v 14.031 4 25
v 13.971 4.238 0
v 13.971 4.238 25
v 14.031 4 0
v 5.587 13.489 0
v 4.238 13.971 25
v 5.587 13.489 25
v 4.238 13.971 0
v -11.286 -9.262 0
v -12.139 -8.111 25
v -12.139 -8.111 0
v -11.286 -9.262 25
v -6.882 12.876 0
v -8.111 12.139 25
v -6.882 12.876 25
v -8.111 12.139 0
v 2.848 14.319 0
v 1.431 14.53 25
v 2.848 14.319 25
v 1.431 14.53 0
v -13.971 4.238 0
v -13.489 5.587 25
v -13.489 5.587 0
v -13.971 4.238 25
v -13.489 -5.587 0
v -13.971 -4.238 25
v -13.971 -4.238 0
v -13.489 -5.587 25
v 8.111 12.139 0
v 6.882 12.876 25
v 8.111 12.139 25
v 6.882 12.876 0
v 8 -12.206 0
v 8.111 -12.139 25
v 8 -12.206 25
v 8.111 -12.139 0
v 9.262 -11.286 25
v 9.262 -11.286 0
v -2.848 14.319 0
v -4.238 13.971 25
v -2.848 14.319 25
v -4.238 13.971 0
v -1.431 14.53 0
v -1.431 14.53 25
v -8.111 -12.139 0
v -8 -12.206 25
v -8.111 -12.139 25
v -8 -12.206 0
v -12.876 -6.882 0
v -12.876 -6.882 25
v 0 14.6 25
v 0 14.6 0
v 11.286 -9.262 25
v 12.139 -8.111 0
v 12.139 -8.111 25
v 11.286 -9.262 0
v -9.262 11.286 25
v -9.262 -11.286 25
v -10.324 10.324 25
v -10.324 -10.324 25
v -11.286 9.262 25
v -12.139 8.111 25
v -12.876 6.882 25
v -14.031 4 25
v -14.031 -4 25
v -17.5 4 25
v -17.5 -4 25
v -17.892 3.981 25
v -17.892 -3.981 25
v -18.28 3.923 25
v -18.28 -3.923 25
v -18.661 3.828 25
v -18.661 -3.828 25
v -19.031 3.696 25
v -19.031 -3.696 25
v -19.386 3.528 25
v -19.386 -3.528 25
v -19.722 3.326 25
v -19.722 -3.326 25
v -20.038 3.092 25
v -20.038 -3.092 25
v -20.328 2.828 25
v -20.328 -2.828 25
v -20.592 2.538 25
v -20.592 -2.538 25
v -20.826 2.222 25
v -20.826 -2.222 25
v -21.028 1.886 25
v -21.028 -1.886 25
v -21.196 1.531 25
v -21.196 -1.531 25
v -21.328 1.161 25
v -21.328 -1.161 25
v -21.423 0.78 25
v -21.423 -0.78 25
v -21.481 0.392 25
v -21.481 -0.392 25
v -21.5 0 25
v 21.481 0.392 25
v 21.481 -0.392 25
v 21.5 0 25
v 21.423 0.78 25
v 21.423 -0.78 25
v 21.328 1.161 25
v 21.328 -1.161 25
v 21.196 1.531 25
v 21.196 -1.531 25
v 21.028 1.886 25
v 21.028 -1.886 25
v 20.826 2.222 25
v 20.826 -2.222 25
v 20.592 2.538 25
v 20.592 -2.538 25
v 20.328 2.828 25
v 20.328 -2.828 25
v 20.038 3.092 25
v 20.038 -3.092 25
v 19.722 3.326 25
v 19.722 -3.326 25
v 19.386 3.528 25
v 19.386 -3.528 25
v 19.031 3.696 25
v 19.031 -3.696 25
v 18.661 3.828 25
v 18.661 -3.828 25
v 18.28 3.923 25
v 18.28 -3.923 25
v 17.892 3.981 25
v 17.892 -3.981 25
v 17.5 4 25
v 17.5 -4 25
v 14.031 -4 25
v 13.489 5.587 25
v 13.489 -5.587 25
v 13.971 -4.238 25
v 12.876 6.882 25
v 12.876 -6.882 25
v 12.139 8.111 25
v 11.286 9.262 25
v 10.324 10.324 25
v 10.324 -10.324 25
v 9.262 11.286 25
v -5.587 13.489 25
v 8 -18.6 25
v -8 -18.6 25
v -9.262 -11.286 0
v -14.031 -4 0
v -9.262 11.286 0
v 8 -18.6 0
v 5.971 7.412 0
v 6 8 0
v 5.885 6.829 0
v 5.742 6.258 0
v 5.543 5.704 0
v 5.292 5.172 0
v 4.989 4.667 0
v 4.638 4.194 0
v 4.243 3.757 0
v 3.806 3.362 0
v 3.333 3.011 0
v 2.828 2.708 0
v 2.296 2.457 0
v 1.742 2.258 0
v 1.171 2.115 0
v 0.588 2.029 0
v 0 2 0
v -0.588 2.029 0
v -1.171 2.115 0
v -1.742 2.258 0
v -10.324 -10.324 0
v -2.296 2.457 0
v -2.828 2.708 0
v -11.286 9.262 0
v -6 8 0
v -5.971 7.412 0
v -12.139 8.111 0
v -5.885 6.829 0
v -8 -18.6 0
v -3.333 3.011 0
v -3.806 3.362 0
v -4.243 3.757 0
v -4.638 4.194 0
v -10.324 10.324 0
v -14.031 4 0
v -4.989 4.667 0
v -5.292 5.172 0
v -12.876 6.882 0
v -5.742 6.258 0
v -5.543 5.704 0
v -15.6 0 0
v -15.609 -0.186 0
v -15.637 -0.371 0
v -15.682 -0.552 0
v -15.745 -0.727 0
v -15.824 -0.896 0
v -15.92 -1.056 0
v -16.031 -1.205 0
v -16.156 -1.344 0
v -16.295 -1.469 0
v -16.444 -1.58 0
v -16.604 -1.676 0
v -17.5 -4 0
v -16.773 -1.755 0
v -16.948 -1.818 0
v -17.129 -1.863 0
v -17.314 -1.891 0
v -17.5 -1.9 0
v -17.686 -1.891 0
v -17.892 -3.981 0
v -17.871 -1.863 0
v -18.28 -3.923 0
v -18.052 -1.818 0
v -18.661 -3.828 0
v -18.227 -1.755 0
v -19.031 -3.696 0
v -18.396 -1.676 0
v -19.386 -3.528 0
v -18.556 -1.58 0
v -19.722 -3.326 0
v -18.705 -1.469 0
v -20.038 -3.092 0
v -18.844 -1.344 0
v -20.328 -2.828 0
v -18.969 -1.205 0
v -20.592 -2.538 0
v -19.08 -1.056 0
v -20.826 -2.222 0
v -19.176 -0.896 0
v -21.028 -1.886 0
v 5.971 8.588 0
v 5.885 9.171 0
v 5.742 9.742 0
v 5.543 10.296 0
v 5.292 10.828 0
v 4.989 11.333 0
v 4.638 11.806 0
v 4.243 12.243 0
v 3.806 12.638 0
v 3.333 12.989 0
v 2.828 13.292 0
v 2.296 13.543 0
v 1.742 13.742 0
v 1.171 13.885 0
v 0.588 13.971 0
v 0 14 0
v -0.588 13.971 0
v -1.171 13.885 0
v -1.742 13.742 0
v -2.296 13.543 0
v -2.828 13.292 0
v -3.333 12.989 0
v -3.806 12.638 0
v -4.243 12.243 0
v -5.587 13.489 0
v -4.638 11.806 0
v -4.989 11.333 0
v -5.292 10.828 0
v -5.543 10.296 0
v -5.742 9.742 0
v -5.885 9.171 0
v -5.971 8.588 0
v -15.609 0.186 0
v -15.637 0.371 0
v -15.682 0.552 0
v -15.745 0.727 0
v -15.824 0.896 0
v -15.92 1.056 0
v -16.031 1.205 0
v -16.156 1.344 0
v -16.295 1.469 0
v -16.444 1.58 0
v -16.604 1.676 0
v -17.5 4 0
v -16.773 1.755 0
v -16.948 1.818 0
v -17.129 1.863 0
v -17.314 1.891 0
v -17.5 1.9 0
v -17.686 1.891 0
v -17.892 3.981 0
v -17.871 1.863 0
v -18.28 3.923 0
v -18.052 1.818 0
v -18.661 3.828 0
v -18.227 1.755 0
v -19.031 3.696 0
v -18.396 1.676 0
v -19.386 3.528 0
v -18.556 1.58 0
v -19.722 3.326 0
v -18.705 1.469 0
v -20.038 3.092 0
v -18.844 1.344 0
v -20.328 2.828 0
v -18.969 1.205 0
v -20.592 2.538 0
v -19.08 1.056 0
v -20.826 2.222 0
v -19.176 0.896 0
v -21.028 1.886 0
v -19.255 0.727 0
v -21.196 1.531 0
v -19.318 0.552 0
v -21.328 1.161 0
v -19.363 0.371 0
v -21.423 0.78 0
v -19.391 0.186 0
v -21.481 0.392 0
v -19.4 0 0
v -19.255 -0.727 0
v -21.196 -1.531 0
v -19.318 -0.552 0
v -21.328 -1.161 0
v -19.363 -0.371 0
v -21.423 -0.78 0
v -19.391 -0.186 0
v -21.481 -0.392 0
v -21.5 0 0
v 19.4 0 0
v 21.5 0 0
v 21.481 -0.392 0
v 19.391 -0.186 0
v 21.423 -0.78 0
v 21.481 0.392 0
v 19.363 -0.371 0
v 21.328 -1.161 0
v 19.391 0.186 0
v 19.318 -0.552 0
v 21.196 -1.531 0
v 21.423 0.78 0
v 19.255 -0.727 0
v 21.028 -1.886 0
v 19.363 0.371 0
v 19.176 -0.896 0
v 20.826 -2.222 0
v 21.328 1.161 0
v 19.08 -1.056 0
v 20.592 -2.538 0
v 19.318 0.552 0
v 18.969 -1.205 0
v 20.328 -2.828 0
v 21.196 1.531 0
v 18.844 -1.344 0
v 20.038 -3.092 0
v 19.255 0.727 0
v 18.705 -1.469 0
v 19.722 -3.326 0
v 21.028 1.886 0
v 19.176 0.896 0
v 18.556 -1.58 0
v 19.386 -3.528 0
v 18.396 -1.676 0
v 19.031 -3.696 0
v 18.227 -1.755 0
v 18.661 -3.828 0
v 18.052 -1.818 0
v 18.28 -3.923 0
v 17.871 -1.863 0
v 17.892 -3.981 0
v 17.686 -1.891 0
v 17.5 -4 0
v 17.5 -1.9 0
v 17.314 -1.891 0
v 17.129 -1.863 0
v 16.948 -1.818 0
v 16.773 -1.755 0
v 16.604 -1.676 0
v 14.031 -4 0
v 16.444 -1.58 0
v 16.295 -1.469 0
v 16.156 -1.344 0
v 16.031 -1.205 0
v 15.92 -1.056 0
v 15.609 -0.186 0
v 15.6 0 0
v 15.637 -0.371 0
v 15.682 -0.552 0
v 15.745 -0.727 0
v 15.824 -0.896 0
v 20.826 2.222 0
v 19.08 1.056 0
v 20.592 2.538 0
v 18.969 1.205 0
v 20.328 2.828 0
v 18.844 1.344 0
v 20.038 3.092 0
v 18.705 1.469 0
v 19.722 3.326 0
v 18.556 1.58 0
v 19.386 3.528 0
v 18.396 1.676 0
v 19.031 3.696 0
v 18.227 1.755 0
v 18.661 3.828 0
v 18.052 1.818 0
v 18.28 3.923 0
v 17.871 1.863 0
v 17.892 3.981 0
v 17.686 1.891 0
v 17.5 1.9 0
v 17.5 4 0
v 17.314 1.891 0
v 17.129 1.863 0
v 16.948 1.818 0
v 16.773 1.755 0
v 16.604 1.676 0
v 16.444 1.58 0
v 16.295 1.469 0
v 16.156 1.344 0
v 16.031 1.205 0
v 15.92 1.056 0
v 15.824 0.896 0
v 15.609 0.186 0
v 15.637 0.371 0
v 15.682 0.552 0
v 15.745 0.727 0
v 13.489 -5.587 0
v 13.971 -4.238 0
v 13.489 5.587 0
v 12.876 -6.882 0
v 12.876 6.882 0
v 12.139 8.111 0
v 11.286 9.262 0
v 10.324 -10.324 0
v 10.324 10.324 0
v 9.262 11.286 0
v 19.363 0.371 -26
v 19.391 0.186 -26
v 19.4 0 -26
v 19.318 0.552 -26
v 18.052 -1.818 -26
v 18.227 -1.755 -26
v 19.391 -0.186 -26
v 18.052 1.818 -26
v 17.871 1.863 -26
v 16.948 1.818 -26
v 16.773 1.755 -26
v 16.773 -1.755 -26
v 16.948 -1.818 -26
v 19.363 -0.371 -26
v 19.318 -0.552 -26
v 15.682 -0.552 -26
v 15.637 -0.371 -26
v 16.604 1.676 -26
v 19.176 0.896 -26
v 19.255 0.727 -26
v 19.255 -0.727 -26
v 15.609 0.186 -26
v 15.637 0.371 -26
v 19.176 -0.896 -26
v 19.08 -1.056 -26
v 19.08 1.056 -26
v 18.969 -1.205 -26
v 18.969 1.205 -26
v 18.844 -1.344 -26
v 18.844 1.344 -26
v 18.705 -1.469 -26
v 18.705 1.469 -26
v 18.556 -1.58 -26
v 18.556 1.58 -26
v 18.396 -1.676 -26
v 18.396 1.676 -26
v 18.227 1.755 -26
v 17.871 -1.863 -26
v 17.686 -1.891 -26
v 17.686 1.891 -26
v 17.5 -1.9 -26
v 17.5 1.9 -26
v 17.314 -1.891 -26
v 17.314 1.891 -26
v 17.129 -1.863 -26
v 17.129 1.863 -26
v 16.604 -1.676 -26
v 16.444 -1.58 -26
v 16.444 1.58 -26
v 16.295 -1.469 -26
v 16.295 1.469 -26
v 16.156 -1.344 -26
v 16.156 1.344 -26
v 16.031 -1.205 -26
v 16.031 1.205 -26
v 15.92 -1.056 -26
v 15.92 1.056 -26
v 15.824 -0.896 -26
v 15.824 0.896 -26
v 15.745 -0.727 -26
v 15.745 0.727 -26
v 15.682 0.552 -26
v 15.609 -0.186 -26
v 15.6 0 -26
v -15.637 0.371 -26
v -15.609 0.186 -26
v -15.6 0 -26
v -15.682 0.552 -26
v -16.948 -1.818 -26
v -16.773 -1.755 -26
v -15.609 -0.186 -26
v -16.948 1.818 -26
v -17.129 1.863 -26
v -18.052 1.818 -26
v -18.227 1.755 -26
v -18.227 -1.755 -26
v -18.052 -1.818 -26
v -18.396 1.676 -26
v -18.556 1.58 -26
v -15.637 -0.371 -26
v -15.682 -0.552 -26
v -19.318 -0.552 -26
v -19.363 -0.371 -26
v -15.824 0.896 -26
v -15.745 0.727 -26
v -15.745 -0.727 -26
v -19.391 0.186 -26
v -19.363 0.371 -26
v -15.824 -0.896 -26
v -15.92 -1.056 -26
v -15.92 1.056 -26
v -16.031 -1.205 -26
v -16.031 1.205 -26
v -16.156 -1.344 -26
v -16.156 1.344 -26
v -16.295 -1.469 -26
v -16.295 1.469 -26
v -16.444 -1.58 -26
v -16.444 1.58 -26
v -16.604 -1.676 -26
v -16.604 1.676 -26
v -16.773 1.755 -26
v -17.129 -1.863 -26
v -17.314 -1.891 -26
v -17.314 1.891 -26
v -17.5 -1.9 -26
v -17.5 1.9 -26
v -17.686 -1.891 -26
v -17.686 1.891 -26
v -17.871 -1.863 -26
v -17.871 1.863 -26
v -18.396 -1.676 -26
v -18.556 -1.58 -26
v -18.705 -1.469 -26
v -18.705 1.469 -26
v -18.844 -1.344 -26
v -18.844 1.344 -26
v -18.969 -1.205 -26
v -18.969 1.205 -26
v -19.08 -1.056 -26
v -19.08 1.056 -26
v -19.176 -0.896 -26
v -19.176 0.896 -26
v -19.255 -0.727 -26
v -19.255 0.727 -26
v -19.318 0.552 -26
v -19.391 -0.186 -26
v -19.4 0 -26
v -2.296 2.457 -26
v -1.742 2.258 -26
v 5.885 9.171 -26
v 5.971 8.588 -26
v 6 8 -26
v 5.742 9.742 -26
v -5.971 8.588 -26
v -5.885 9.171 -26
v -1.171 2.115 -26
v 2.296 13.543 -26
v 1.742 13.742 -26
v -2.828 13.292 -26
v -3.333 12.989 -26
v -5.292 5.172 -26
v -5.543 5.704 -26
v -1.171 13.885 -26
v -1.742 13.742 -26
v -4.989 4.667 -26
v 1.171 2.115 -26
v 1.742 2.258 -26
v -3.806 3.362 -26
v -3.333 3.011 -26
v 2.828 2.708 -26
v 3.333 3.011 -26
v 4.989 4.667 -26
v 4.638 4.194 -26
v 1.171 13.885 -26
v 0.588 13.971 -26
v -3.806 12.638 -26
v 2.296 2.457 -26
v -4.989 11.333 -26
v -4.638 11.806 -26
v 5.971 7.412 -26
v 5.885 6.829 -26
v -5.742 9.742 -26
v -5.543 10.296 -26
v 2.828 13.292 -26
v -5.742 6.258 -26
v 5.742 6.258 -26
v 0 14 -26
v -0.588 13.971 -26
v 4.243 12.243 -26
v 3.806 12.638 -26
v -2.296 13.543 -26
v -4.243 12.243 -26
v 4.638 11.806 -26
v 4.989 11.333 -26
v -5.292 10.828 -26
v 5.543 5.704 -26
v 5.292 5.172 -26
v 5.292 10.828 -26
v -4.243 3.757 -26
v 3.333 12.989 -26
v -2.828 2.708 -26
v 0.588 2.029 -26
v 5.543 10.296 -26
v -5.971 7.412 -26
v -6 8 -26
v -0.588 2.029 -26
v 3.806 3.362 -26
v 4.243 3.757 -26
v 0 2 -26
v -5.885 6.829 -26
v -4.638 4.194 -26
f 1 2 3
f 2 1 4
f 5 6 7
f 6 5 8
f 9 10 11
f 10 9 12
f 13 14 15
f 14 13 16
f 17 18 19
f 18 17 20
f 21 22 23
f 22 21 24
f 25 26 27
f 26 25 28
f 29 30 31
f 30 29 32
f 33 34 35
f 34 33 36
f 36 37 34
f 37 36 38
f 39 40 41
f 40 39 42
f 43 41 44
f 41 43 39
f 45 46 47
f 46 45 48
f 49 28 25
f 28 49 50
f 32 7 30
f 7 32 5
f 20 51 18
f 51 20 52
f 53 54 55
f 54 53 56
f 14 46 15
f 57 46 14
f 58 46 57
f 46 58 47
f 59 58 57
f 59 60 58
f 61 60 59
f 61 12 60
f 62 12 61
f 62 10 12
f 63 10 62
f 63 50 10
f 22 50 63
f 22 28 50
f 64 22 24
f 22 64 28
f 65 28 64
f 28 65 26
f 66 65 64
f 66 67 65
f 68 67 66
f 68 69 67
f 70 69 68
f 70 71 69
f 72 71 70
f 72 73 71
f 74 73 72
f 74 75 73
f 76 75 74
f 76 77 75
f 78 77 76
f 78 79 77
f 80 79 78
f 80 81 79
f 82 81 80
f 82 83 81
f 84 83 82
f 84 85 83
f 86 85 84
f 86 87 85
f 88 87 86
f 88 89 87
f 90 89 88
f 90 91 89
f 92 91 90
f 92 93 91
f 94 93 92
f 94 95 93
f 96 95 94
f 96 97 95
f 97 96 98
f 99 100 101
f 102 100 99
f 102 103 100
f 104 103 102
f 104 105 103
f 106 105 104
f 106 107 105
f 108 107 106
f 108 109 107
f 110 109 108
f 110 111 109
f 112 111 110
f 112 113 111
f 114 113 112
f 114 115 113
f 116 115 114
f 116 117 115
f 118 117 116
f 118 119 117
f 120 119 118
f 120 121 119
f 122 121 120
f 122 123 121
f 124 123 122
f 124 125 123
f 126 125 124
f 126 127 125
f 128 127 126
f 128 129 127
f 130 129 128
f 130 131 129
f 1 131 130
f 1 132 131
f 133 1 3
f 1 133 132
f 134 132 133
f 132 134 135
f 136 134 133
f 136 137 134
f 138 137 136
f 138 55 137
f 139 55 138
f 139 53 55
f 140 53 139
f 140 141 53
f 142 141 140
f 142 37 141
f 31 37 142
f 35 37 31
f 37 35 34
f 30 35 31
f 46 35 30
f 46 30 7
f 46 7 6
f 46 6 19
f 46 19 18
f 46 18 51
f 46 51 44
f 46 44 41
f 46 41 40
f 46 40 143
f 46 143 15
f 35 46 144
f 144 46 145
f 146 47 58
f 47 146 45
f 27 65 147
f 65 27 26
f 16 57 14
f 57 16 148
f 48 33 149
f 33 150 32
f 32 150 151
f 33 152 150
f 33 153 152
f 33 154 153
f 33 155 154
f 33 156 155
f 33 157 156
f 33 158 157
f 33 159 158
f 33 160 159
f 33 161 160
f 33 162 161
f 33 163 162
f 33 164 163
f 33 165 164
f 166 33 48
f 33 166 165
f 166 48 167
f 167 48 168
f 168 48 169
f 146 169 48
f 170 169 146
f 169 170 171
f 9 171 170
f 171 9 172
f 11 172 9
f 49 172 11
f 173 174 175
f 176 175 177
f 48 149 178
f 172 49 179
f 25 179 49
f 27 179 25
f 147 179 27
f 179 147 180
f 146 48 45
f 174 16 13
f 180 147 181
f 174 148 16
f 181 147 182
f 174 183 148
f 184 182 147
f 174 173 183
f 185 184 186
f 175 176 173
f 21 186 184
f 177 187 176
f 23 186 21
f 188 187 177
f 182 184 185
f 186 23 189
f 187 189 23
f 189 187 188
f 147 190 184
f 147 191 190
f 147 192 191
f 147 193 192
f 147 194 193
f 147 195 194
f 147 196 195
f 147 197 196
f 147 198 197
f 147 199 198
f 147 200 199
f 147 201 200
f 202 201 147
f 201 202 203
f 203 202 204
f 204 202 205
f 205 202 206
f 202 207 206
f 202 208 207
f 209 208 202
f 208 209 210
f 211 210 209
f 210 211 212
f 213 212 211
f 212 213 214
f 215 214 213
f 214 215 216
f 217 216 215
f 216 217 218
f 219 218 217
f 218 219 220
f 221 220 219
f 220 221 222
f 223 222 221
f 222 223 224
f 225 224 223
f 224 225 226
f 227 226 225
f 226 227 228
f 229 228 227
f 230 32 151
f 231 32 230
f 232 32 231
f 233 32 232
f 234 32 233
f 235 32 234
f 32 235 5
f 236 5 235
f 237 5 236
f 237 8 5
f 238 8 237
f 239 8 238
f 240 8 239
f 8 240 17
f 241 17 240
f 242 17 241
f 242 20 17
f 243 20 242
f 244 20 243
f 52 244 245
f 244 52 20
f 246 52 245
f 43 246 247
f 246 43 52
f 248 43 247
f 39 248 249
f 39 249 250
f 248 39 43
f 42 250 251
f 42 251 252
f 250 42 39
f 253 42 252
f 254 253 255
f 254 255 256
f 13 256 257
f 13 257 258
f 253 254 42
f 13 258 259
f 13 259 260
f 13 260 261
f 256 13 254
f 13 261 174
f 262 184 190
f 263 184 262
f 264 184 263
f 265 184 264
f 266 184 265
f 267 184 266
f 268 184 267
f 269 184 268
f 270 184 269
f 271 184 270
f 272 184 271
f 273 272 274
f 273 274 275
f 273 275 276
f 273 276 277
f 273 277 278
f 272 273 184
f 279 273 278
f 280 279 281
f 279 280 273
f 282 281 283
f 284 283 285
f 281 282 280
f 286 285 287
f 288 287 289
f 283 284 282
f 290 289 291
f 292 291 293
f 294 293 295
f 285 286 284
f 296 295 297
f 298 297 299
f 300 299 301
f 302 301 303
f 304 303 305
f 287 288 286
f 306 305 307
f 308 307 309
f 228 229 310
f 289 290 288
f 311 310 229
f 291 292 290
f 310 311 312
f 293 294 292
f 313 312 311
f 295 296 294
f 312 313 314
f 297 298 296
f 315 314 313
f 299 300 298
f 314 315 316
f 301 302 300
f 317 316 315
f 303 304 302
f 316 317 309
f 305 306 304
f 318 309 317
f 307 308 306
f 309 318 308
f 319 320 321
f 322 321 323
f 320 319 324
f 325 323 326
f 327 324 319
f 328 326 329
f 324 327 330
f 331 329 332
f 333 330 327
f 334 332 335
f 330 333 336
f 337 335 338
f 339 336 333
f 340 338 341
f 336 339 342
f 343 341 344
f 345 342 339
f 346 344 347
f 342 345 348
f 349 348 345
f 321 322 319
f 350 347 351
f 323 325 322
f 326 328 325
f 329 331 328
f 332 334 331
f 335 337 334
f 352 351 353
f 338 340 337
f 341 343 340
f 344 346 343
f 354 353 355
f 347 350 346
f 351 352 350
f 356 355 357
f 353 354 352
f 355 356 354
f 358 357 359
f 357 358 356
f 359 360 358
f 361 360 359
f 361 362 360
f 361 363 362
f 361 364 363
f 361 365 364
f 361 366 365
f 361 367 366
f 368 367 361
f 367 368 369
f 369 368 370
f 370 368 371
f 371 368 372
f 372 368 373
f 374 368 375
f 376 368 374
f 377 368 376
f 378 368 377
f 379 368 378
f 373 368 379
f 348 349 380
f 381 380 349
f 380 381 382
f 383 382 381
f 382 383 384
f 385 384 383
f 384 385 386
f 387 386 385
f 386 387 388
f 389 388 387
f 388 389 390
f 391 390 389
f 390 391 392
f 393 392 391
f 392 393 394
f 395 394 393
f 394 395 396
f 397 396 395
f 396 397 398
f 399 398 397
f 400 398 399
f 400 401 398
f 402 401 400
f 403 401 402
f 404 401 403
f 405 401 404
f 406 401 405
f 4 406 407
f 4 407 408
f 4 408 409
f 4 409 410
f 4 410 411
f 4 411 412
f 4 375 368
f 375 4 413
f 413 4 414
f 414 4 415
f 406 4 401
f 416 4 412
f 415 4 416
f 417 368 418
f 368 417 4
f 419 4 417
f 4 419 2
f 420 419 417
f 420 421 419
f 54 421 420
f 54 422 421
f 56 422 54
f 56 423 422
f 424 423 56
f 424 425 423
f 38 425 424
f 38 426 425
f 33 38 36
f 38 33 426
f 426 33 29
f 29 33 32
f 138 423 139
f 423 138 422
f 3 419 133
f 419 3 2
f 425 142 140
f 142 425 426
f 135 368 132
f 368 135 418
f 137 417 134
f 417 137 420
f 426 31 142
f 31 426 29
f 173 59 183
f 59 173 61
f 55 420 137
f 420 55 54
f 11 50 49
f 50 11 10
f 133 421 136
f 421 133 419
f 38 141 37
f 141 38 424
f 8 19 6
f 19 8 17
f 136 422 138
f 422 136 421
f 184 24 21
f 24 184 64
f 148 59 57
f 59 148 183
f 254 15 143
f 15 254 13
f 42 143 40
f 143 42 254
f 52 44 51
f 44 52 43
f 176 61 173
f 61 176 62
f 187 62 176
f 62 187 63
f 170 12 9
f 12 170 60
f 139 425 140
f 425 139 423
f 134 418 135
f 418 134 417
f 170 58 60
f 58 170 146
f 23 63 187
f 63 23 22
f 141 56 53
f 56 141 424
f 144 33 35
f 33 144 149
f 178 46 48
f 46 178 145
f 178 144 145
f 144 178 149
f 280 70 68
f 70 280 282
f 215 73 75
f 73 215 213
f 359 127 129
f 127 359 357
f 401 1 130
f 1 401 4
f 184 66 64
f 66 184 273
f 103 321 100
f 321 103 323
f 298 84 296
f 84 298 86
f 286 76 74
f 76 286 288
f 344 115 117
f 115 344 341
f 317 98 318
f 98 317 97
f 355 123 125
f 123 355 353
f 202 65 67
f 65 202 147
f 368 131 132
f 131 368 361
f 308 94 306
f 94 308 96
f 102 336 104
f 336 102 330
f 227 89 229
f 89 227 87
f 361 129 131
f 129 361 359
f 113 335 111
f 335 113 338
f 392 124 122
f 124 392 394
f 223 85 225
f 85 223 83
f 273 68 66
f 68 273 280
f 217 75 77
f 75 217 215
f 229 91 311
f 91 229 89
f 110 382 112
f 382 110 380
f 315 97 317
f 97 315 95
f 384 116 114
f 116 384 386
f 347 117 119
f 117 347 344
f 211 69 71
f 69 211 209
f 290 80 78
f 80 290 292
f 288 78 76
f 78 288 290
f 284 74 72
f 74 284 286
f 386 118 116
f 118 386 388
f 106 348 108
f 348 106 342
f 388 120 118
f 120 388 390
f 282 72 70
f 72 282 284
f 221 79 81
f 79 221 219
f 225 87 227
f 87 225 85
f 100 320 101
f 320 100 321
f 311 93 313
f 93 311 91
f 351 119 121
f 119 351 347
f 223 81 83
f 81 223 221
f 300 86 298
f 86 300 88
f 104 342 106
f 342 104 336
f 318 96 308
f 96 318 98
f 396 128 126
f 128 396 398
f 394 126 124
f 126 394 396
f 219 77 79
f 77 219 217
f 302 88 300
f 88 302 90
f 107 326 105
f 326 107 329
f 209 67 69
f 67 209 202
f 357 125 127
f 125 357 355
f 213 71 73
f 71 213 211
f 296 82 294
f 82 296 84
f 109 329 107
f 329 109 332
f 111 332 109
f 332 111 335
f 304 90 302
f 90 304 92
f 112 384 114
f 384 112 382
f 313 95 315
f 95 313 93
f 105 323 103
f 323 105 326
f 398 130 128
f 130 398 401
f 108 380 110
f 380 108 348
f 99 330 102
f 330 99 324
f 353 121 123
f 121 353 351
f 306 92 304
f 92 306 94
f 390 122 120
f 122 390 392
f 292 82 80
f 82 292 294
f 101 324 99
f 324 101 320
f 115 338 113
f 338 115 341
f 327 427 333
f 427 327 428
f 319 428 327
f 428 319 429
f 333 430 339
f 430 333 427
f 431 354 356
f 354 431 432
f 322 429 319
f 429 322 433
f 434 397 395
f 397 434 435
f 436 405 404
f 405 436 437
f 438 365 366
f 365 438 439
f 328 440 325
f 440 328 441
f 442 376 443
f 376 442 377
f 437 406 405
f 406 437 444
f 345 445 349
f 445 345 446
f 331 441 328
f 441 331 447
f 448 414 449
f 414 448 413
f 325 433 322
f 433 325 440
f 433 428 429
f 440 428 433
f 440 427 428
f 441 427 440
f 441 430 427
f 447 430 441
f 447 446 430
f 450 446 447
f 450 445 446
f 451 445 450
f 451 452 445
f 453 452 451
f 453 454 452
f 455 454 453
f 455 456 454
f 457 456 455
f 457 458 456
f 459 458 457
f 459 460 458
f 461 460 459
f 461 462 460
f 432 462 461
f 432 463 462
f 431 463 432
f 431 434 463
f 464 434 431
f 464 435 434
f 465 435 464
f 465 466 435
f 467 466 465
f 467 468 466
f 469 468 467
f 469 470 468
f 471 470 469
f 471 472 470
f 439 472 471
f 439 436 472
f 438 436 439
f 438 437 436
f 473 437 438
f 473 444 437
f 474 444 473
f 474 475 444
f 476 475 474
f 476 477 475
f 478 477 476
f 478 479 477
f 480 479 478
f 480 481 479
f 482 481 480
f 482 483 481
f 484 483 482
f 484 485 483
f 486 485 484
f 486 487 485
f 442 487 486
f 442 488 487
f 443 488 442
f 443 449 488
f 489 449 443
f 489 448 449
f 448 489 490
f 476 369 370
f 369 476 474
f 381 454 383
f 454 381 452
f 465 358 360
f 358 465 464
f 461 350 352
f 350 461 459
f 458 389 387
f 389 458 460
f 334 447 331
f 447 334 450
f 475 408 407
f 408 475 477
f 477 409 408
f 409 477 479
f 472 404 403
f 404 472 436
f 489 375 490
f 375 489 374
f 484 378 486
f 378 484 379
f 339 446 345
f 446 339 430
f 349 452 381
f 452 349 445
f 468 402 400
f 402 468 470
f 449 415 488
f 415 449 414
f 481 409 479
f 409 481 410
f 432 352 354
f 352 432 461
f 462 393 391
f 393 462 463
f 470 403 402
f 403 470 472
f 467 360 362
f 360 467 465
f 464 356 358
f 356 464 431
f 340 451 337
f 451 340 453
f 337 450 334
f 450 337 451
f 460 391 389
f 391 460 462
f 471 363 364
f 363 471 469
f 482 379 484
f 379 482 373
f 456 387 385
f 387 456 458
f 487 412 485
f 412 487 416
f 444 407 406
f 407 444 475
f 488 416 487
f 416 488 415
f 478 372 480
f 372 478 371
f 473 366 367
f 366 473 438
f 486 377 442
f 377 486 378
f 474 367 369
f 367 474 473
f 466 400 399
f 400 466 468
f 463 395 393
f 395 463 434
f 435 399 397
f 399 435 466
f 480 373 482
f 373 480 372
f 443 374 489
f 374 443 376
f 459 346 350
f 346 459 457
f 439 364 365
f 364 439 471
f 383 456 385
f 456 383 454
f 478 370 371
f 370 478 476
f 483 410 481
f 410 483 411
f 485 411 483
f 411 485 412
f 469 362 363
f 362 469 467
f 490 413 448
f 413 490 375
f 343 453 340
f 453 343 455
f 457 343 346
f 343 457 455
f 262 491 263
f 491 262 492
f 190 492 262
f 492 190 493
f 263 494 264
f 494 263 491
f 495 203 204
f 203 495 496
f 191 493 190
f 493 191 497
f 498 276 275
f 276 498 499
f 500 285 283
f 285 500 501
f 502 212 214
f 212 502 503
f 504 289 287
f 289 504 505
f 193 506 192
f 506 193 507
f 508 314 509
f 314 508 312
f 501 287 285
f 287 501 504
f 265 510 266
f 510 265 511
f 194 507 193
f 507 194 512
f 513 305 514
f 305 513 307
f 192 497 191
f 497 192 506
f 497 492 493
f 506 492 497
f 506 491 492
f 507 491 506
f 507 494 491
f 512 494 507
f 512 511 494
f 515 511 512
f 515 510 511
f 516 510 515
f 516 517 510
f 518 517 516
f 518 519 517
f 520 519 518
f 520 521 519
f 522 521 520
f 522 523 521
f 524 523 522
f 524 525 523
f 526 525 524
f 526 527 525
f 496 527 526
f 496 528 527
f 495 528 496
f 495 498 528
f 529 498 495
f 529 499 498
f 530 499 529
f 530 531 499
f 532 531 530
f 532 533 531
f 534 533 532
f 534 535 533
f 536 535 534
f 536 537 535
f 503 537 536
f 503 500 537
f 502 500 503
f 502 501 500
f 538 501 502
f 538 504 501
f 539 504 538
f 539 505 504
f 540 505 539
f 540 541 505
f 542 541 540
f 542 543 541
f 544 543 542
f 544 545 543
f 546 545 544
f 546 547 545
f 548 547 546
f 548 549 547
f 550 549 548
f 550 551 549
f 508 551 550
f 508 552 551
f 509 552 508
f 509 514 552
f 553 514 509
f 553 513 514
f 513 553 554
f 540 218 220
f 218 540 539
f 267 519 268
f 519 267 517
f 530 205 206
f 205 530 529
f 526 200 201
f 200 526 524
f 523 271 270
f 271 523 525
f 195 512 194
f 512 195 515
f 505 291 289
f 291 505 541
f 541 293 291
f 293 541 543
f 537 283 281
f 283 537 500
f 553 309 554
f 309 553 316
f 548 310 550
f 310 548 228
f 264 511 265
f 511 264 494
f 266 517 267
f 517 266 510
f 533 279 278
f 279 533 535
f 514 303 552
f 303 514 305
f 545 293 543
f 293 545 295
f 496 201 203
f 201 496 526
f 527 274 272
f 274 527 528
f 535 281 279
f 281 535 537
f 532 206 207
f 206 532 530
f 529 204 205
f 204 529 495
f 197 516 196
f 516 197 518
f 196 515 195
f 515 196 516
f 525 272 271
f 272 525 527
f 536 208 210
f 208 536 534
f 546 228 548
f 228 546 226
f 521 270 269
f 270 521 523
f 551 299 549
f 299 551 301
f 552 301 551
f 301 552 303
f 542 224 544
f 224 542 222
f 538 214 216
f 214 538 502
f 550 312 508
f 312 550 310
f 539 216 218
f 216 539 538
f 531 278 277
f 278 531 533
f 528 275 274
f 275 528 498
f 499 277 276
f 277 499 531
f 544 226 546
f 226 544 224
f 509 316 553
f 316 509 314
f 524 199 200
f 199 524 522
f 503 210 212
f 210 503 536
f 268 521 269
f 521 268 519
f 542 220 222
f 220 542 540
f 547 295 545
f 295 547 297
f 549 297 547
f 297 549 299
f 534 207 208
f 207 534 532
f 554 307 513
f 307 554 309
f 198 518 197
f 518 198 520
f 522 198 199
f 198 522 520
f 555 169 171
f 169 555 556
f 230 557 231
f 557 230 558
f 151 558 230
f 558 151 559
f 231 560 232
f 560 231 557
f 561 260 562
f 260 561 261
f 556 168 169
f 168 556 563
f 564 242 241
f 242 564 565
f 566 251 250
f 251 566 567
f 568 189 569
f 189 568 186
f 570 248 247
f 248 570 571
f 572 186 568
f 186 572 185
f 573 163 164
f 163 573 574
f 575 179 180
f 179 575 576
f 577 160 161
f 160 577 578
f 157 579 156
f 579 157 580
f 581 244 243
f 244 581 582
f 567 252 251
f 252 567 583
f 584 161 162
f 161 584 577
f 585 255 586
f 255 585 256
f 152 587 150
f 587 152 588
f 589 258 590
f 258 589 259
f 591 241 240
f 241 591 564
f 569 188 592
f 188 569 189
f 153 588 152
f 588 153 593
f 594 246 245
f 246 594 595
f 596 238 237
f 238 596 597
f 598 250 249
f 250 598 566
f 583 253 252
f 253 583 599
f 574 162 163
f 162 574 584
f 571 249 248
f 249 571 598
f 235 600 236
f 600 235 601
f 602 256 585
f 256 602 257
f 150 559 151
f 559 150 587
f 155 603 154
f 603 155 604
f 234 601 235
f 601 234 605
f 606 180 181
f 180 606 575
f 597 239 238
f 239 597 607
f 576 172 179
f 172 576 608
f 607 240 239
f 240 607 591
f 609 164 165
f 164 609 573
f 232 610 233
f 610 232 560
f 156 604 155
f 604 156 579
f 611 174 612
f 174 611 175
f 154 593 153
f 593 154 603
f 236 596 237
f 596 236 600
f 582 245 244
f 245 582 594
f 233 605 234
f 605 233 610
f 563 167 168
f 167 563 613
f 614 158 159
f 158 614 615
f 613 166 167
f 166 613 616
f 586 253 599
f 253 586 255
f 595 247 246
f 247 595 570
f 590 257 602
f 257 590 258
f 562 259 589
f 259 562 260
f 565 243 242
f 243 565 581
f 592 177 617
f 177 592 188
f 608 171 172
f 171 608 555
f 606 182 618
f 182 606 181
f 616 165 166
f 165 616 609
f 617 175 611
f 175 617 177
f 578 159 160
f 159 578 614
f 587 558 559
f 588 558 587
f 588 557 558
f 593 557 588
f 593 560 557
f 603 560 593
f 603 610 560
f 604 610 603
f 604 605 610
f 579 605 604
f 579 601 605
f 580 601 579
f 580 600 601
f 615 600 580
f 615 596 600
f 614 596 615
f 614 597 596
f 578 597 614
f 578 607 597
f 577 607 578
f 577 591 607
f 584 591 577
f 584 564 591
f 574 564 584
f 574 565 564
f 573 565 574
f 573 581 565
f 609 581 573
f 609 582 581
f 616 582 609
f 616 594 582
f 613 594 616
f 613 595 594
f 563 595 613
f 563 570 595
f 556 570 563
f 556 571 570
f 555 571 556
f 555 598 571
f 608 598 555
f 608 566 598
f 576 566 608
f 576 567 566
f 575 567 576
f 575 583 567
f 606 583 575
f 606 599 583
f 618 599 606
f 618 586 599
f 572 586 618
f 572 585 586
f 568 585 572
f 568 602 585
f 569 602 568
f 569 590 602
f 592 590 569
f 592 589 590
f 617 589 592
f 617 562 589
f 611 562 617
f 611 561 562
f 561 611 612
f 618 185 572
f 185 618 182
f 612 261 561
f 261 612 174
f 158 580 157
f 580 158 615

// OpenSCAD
MotorCut_28BYJ_48();
//AxisCut_28BYJ_48();

module MotorCut_28BYJ_48()
{
	union()
	{
		cylinder(d=29.2,h=25,$fn=64);
		translate([0,-10.6,12.5])
		cube([16,16,25], center=true);
		hull()
		{
			translate([17.5,0,0])
			cylinder(d=8, h=25, $fn=64);
			translate([-17.5,0,0])
			cylinder(d=8, h=25, $fn=64);
		}
		translate([17.5,0,-1])
		cylinder(d=3.8,h=50,$fn=64,center=true);
		translate([-17.5,0,-1])
		cylinder(d=3.8,h=50,$fn=64,center=true);
		translate([0,8,-12])
		cylinder(d=12,h=28,$fn=64,center=true);
	}
}

module AxisCut_28BYJ_48()
{
    translate([0,0,-2])
	difference()
	{
		cylinder(d=5.2,h=10.6,$fn=64);
		translate([0,4.8,8])
		cube([10,6,8], center=true);
		translate([0,-4.8,8])
		cube([10,6,8], center=true);
	}
}
